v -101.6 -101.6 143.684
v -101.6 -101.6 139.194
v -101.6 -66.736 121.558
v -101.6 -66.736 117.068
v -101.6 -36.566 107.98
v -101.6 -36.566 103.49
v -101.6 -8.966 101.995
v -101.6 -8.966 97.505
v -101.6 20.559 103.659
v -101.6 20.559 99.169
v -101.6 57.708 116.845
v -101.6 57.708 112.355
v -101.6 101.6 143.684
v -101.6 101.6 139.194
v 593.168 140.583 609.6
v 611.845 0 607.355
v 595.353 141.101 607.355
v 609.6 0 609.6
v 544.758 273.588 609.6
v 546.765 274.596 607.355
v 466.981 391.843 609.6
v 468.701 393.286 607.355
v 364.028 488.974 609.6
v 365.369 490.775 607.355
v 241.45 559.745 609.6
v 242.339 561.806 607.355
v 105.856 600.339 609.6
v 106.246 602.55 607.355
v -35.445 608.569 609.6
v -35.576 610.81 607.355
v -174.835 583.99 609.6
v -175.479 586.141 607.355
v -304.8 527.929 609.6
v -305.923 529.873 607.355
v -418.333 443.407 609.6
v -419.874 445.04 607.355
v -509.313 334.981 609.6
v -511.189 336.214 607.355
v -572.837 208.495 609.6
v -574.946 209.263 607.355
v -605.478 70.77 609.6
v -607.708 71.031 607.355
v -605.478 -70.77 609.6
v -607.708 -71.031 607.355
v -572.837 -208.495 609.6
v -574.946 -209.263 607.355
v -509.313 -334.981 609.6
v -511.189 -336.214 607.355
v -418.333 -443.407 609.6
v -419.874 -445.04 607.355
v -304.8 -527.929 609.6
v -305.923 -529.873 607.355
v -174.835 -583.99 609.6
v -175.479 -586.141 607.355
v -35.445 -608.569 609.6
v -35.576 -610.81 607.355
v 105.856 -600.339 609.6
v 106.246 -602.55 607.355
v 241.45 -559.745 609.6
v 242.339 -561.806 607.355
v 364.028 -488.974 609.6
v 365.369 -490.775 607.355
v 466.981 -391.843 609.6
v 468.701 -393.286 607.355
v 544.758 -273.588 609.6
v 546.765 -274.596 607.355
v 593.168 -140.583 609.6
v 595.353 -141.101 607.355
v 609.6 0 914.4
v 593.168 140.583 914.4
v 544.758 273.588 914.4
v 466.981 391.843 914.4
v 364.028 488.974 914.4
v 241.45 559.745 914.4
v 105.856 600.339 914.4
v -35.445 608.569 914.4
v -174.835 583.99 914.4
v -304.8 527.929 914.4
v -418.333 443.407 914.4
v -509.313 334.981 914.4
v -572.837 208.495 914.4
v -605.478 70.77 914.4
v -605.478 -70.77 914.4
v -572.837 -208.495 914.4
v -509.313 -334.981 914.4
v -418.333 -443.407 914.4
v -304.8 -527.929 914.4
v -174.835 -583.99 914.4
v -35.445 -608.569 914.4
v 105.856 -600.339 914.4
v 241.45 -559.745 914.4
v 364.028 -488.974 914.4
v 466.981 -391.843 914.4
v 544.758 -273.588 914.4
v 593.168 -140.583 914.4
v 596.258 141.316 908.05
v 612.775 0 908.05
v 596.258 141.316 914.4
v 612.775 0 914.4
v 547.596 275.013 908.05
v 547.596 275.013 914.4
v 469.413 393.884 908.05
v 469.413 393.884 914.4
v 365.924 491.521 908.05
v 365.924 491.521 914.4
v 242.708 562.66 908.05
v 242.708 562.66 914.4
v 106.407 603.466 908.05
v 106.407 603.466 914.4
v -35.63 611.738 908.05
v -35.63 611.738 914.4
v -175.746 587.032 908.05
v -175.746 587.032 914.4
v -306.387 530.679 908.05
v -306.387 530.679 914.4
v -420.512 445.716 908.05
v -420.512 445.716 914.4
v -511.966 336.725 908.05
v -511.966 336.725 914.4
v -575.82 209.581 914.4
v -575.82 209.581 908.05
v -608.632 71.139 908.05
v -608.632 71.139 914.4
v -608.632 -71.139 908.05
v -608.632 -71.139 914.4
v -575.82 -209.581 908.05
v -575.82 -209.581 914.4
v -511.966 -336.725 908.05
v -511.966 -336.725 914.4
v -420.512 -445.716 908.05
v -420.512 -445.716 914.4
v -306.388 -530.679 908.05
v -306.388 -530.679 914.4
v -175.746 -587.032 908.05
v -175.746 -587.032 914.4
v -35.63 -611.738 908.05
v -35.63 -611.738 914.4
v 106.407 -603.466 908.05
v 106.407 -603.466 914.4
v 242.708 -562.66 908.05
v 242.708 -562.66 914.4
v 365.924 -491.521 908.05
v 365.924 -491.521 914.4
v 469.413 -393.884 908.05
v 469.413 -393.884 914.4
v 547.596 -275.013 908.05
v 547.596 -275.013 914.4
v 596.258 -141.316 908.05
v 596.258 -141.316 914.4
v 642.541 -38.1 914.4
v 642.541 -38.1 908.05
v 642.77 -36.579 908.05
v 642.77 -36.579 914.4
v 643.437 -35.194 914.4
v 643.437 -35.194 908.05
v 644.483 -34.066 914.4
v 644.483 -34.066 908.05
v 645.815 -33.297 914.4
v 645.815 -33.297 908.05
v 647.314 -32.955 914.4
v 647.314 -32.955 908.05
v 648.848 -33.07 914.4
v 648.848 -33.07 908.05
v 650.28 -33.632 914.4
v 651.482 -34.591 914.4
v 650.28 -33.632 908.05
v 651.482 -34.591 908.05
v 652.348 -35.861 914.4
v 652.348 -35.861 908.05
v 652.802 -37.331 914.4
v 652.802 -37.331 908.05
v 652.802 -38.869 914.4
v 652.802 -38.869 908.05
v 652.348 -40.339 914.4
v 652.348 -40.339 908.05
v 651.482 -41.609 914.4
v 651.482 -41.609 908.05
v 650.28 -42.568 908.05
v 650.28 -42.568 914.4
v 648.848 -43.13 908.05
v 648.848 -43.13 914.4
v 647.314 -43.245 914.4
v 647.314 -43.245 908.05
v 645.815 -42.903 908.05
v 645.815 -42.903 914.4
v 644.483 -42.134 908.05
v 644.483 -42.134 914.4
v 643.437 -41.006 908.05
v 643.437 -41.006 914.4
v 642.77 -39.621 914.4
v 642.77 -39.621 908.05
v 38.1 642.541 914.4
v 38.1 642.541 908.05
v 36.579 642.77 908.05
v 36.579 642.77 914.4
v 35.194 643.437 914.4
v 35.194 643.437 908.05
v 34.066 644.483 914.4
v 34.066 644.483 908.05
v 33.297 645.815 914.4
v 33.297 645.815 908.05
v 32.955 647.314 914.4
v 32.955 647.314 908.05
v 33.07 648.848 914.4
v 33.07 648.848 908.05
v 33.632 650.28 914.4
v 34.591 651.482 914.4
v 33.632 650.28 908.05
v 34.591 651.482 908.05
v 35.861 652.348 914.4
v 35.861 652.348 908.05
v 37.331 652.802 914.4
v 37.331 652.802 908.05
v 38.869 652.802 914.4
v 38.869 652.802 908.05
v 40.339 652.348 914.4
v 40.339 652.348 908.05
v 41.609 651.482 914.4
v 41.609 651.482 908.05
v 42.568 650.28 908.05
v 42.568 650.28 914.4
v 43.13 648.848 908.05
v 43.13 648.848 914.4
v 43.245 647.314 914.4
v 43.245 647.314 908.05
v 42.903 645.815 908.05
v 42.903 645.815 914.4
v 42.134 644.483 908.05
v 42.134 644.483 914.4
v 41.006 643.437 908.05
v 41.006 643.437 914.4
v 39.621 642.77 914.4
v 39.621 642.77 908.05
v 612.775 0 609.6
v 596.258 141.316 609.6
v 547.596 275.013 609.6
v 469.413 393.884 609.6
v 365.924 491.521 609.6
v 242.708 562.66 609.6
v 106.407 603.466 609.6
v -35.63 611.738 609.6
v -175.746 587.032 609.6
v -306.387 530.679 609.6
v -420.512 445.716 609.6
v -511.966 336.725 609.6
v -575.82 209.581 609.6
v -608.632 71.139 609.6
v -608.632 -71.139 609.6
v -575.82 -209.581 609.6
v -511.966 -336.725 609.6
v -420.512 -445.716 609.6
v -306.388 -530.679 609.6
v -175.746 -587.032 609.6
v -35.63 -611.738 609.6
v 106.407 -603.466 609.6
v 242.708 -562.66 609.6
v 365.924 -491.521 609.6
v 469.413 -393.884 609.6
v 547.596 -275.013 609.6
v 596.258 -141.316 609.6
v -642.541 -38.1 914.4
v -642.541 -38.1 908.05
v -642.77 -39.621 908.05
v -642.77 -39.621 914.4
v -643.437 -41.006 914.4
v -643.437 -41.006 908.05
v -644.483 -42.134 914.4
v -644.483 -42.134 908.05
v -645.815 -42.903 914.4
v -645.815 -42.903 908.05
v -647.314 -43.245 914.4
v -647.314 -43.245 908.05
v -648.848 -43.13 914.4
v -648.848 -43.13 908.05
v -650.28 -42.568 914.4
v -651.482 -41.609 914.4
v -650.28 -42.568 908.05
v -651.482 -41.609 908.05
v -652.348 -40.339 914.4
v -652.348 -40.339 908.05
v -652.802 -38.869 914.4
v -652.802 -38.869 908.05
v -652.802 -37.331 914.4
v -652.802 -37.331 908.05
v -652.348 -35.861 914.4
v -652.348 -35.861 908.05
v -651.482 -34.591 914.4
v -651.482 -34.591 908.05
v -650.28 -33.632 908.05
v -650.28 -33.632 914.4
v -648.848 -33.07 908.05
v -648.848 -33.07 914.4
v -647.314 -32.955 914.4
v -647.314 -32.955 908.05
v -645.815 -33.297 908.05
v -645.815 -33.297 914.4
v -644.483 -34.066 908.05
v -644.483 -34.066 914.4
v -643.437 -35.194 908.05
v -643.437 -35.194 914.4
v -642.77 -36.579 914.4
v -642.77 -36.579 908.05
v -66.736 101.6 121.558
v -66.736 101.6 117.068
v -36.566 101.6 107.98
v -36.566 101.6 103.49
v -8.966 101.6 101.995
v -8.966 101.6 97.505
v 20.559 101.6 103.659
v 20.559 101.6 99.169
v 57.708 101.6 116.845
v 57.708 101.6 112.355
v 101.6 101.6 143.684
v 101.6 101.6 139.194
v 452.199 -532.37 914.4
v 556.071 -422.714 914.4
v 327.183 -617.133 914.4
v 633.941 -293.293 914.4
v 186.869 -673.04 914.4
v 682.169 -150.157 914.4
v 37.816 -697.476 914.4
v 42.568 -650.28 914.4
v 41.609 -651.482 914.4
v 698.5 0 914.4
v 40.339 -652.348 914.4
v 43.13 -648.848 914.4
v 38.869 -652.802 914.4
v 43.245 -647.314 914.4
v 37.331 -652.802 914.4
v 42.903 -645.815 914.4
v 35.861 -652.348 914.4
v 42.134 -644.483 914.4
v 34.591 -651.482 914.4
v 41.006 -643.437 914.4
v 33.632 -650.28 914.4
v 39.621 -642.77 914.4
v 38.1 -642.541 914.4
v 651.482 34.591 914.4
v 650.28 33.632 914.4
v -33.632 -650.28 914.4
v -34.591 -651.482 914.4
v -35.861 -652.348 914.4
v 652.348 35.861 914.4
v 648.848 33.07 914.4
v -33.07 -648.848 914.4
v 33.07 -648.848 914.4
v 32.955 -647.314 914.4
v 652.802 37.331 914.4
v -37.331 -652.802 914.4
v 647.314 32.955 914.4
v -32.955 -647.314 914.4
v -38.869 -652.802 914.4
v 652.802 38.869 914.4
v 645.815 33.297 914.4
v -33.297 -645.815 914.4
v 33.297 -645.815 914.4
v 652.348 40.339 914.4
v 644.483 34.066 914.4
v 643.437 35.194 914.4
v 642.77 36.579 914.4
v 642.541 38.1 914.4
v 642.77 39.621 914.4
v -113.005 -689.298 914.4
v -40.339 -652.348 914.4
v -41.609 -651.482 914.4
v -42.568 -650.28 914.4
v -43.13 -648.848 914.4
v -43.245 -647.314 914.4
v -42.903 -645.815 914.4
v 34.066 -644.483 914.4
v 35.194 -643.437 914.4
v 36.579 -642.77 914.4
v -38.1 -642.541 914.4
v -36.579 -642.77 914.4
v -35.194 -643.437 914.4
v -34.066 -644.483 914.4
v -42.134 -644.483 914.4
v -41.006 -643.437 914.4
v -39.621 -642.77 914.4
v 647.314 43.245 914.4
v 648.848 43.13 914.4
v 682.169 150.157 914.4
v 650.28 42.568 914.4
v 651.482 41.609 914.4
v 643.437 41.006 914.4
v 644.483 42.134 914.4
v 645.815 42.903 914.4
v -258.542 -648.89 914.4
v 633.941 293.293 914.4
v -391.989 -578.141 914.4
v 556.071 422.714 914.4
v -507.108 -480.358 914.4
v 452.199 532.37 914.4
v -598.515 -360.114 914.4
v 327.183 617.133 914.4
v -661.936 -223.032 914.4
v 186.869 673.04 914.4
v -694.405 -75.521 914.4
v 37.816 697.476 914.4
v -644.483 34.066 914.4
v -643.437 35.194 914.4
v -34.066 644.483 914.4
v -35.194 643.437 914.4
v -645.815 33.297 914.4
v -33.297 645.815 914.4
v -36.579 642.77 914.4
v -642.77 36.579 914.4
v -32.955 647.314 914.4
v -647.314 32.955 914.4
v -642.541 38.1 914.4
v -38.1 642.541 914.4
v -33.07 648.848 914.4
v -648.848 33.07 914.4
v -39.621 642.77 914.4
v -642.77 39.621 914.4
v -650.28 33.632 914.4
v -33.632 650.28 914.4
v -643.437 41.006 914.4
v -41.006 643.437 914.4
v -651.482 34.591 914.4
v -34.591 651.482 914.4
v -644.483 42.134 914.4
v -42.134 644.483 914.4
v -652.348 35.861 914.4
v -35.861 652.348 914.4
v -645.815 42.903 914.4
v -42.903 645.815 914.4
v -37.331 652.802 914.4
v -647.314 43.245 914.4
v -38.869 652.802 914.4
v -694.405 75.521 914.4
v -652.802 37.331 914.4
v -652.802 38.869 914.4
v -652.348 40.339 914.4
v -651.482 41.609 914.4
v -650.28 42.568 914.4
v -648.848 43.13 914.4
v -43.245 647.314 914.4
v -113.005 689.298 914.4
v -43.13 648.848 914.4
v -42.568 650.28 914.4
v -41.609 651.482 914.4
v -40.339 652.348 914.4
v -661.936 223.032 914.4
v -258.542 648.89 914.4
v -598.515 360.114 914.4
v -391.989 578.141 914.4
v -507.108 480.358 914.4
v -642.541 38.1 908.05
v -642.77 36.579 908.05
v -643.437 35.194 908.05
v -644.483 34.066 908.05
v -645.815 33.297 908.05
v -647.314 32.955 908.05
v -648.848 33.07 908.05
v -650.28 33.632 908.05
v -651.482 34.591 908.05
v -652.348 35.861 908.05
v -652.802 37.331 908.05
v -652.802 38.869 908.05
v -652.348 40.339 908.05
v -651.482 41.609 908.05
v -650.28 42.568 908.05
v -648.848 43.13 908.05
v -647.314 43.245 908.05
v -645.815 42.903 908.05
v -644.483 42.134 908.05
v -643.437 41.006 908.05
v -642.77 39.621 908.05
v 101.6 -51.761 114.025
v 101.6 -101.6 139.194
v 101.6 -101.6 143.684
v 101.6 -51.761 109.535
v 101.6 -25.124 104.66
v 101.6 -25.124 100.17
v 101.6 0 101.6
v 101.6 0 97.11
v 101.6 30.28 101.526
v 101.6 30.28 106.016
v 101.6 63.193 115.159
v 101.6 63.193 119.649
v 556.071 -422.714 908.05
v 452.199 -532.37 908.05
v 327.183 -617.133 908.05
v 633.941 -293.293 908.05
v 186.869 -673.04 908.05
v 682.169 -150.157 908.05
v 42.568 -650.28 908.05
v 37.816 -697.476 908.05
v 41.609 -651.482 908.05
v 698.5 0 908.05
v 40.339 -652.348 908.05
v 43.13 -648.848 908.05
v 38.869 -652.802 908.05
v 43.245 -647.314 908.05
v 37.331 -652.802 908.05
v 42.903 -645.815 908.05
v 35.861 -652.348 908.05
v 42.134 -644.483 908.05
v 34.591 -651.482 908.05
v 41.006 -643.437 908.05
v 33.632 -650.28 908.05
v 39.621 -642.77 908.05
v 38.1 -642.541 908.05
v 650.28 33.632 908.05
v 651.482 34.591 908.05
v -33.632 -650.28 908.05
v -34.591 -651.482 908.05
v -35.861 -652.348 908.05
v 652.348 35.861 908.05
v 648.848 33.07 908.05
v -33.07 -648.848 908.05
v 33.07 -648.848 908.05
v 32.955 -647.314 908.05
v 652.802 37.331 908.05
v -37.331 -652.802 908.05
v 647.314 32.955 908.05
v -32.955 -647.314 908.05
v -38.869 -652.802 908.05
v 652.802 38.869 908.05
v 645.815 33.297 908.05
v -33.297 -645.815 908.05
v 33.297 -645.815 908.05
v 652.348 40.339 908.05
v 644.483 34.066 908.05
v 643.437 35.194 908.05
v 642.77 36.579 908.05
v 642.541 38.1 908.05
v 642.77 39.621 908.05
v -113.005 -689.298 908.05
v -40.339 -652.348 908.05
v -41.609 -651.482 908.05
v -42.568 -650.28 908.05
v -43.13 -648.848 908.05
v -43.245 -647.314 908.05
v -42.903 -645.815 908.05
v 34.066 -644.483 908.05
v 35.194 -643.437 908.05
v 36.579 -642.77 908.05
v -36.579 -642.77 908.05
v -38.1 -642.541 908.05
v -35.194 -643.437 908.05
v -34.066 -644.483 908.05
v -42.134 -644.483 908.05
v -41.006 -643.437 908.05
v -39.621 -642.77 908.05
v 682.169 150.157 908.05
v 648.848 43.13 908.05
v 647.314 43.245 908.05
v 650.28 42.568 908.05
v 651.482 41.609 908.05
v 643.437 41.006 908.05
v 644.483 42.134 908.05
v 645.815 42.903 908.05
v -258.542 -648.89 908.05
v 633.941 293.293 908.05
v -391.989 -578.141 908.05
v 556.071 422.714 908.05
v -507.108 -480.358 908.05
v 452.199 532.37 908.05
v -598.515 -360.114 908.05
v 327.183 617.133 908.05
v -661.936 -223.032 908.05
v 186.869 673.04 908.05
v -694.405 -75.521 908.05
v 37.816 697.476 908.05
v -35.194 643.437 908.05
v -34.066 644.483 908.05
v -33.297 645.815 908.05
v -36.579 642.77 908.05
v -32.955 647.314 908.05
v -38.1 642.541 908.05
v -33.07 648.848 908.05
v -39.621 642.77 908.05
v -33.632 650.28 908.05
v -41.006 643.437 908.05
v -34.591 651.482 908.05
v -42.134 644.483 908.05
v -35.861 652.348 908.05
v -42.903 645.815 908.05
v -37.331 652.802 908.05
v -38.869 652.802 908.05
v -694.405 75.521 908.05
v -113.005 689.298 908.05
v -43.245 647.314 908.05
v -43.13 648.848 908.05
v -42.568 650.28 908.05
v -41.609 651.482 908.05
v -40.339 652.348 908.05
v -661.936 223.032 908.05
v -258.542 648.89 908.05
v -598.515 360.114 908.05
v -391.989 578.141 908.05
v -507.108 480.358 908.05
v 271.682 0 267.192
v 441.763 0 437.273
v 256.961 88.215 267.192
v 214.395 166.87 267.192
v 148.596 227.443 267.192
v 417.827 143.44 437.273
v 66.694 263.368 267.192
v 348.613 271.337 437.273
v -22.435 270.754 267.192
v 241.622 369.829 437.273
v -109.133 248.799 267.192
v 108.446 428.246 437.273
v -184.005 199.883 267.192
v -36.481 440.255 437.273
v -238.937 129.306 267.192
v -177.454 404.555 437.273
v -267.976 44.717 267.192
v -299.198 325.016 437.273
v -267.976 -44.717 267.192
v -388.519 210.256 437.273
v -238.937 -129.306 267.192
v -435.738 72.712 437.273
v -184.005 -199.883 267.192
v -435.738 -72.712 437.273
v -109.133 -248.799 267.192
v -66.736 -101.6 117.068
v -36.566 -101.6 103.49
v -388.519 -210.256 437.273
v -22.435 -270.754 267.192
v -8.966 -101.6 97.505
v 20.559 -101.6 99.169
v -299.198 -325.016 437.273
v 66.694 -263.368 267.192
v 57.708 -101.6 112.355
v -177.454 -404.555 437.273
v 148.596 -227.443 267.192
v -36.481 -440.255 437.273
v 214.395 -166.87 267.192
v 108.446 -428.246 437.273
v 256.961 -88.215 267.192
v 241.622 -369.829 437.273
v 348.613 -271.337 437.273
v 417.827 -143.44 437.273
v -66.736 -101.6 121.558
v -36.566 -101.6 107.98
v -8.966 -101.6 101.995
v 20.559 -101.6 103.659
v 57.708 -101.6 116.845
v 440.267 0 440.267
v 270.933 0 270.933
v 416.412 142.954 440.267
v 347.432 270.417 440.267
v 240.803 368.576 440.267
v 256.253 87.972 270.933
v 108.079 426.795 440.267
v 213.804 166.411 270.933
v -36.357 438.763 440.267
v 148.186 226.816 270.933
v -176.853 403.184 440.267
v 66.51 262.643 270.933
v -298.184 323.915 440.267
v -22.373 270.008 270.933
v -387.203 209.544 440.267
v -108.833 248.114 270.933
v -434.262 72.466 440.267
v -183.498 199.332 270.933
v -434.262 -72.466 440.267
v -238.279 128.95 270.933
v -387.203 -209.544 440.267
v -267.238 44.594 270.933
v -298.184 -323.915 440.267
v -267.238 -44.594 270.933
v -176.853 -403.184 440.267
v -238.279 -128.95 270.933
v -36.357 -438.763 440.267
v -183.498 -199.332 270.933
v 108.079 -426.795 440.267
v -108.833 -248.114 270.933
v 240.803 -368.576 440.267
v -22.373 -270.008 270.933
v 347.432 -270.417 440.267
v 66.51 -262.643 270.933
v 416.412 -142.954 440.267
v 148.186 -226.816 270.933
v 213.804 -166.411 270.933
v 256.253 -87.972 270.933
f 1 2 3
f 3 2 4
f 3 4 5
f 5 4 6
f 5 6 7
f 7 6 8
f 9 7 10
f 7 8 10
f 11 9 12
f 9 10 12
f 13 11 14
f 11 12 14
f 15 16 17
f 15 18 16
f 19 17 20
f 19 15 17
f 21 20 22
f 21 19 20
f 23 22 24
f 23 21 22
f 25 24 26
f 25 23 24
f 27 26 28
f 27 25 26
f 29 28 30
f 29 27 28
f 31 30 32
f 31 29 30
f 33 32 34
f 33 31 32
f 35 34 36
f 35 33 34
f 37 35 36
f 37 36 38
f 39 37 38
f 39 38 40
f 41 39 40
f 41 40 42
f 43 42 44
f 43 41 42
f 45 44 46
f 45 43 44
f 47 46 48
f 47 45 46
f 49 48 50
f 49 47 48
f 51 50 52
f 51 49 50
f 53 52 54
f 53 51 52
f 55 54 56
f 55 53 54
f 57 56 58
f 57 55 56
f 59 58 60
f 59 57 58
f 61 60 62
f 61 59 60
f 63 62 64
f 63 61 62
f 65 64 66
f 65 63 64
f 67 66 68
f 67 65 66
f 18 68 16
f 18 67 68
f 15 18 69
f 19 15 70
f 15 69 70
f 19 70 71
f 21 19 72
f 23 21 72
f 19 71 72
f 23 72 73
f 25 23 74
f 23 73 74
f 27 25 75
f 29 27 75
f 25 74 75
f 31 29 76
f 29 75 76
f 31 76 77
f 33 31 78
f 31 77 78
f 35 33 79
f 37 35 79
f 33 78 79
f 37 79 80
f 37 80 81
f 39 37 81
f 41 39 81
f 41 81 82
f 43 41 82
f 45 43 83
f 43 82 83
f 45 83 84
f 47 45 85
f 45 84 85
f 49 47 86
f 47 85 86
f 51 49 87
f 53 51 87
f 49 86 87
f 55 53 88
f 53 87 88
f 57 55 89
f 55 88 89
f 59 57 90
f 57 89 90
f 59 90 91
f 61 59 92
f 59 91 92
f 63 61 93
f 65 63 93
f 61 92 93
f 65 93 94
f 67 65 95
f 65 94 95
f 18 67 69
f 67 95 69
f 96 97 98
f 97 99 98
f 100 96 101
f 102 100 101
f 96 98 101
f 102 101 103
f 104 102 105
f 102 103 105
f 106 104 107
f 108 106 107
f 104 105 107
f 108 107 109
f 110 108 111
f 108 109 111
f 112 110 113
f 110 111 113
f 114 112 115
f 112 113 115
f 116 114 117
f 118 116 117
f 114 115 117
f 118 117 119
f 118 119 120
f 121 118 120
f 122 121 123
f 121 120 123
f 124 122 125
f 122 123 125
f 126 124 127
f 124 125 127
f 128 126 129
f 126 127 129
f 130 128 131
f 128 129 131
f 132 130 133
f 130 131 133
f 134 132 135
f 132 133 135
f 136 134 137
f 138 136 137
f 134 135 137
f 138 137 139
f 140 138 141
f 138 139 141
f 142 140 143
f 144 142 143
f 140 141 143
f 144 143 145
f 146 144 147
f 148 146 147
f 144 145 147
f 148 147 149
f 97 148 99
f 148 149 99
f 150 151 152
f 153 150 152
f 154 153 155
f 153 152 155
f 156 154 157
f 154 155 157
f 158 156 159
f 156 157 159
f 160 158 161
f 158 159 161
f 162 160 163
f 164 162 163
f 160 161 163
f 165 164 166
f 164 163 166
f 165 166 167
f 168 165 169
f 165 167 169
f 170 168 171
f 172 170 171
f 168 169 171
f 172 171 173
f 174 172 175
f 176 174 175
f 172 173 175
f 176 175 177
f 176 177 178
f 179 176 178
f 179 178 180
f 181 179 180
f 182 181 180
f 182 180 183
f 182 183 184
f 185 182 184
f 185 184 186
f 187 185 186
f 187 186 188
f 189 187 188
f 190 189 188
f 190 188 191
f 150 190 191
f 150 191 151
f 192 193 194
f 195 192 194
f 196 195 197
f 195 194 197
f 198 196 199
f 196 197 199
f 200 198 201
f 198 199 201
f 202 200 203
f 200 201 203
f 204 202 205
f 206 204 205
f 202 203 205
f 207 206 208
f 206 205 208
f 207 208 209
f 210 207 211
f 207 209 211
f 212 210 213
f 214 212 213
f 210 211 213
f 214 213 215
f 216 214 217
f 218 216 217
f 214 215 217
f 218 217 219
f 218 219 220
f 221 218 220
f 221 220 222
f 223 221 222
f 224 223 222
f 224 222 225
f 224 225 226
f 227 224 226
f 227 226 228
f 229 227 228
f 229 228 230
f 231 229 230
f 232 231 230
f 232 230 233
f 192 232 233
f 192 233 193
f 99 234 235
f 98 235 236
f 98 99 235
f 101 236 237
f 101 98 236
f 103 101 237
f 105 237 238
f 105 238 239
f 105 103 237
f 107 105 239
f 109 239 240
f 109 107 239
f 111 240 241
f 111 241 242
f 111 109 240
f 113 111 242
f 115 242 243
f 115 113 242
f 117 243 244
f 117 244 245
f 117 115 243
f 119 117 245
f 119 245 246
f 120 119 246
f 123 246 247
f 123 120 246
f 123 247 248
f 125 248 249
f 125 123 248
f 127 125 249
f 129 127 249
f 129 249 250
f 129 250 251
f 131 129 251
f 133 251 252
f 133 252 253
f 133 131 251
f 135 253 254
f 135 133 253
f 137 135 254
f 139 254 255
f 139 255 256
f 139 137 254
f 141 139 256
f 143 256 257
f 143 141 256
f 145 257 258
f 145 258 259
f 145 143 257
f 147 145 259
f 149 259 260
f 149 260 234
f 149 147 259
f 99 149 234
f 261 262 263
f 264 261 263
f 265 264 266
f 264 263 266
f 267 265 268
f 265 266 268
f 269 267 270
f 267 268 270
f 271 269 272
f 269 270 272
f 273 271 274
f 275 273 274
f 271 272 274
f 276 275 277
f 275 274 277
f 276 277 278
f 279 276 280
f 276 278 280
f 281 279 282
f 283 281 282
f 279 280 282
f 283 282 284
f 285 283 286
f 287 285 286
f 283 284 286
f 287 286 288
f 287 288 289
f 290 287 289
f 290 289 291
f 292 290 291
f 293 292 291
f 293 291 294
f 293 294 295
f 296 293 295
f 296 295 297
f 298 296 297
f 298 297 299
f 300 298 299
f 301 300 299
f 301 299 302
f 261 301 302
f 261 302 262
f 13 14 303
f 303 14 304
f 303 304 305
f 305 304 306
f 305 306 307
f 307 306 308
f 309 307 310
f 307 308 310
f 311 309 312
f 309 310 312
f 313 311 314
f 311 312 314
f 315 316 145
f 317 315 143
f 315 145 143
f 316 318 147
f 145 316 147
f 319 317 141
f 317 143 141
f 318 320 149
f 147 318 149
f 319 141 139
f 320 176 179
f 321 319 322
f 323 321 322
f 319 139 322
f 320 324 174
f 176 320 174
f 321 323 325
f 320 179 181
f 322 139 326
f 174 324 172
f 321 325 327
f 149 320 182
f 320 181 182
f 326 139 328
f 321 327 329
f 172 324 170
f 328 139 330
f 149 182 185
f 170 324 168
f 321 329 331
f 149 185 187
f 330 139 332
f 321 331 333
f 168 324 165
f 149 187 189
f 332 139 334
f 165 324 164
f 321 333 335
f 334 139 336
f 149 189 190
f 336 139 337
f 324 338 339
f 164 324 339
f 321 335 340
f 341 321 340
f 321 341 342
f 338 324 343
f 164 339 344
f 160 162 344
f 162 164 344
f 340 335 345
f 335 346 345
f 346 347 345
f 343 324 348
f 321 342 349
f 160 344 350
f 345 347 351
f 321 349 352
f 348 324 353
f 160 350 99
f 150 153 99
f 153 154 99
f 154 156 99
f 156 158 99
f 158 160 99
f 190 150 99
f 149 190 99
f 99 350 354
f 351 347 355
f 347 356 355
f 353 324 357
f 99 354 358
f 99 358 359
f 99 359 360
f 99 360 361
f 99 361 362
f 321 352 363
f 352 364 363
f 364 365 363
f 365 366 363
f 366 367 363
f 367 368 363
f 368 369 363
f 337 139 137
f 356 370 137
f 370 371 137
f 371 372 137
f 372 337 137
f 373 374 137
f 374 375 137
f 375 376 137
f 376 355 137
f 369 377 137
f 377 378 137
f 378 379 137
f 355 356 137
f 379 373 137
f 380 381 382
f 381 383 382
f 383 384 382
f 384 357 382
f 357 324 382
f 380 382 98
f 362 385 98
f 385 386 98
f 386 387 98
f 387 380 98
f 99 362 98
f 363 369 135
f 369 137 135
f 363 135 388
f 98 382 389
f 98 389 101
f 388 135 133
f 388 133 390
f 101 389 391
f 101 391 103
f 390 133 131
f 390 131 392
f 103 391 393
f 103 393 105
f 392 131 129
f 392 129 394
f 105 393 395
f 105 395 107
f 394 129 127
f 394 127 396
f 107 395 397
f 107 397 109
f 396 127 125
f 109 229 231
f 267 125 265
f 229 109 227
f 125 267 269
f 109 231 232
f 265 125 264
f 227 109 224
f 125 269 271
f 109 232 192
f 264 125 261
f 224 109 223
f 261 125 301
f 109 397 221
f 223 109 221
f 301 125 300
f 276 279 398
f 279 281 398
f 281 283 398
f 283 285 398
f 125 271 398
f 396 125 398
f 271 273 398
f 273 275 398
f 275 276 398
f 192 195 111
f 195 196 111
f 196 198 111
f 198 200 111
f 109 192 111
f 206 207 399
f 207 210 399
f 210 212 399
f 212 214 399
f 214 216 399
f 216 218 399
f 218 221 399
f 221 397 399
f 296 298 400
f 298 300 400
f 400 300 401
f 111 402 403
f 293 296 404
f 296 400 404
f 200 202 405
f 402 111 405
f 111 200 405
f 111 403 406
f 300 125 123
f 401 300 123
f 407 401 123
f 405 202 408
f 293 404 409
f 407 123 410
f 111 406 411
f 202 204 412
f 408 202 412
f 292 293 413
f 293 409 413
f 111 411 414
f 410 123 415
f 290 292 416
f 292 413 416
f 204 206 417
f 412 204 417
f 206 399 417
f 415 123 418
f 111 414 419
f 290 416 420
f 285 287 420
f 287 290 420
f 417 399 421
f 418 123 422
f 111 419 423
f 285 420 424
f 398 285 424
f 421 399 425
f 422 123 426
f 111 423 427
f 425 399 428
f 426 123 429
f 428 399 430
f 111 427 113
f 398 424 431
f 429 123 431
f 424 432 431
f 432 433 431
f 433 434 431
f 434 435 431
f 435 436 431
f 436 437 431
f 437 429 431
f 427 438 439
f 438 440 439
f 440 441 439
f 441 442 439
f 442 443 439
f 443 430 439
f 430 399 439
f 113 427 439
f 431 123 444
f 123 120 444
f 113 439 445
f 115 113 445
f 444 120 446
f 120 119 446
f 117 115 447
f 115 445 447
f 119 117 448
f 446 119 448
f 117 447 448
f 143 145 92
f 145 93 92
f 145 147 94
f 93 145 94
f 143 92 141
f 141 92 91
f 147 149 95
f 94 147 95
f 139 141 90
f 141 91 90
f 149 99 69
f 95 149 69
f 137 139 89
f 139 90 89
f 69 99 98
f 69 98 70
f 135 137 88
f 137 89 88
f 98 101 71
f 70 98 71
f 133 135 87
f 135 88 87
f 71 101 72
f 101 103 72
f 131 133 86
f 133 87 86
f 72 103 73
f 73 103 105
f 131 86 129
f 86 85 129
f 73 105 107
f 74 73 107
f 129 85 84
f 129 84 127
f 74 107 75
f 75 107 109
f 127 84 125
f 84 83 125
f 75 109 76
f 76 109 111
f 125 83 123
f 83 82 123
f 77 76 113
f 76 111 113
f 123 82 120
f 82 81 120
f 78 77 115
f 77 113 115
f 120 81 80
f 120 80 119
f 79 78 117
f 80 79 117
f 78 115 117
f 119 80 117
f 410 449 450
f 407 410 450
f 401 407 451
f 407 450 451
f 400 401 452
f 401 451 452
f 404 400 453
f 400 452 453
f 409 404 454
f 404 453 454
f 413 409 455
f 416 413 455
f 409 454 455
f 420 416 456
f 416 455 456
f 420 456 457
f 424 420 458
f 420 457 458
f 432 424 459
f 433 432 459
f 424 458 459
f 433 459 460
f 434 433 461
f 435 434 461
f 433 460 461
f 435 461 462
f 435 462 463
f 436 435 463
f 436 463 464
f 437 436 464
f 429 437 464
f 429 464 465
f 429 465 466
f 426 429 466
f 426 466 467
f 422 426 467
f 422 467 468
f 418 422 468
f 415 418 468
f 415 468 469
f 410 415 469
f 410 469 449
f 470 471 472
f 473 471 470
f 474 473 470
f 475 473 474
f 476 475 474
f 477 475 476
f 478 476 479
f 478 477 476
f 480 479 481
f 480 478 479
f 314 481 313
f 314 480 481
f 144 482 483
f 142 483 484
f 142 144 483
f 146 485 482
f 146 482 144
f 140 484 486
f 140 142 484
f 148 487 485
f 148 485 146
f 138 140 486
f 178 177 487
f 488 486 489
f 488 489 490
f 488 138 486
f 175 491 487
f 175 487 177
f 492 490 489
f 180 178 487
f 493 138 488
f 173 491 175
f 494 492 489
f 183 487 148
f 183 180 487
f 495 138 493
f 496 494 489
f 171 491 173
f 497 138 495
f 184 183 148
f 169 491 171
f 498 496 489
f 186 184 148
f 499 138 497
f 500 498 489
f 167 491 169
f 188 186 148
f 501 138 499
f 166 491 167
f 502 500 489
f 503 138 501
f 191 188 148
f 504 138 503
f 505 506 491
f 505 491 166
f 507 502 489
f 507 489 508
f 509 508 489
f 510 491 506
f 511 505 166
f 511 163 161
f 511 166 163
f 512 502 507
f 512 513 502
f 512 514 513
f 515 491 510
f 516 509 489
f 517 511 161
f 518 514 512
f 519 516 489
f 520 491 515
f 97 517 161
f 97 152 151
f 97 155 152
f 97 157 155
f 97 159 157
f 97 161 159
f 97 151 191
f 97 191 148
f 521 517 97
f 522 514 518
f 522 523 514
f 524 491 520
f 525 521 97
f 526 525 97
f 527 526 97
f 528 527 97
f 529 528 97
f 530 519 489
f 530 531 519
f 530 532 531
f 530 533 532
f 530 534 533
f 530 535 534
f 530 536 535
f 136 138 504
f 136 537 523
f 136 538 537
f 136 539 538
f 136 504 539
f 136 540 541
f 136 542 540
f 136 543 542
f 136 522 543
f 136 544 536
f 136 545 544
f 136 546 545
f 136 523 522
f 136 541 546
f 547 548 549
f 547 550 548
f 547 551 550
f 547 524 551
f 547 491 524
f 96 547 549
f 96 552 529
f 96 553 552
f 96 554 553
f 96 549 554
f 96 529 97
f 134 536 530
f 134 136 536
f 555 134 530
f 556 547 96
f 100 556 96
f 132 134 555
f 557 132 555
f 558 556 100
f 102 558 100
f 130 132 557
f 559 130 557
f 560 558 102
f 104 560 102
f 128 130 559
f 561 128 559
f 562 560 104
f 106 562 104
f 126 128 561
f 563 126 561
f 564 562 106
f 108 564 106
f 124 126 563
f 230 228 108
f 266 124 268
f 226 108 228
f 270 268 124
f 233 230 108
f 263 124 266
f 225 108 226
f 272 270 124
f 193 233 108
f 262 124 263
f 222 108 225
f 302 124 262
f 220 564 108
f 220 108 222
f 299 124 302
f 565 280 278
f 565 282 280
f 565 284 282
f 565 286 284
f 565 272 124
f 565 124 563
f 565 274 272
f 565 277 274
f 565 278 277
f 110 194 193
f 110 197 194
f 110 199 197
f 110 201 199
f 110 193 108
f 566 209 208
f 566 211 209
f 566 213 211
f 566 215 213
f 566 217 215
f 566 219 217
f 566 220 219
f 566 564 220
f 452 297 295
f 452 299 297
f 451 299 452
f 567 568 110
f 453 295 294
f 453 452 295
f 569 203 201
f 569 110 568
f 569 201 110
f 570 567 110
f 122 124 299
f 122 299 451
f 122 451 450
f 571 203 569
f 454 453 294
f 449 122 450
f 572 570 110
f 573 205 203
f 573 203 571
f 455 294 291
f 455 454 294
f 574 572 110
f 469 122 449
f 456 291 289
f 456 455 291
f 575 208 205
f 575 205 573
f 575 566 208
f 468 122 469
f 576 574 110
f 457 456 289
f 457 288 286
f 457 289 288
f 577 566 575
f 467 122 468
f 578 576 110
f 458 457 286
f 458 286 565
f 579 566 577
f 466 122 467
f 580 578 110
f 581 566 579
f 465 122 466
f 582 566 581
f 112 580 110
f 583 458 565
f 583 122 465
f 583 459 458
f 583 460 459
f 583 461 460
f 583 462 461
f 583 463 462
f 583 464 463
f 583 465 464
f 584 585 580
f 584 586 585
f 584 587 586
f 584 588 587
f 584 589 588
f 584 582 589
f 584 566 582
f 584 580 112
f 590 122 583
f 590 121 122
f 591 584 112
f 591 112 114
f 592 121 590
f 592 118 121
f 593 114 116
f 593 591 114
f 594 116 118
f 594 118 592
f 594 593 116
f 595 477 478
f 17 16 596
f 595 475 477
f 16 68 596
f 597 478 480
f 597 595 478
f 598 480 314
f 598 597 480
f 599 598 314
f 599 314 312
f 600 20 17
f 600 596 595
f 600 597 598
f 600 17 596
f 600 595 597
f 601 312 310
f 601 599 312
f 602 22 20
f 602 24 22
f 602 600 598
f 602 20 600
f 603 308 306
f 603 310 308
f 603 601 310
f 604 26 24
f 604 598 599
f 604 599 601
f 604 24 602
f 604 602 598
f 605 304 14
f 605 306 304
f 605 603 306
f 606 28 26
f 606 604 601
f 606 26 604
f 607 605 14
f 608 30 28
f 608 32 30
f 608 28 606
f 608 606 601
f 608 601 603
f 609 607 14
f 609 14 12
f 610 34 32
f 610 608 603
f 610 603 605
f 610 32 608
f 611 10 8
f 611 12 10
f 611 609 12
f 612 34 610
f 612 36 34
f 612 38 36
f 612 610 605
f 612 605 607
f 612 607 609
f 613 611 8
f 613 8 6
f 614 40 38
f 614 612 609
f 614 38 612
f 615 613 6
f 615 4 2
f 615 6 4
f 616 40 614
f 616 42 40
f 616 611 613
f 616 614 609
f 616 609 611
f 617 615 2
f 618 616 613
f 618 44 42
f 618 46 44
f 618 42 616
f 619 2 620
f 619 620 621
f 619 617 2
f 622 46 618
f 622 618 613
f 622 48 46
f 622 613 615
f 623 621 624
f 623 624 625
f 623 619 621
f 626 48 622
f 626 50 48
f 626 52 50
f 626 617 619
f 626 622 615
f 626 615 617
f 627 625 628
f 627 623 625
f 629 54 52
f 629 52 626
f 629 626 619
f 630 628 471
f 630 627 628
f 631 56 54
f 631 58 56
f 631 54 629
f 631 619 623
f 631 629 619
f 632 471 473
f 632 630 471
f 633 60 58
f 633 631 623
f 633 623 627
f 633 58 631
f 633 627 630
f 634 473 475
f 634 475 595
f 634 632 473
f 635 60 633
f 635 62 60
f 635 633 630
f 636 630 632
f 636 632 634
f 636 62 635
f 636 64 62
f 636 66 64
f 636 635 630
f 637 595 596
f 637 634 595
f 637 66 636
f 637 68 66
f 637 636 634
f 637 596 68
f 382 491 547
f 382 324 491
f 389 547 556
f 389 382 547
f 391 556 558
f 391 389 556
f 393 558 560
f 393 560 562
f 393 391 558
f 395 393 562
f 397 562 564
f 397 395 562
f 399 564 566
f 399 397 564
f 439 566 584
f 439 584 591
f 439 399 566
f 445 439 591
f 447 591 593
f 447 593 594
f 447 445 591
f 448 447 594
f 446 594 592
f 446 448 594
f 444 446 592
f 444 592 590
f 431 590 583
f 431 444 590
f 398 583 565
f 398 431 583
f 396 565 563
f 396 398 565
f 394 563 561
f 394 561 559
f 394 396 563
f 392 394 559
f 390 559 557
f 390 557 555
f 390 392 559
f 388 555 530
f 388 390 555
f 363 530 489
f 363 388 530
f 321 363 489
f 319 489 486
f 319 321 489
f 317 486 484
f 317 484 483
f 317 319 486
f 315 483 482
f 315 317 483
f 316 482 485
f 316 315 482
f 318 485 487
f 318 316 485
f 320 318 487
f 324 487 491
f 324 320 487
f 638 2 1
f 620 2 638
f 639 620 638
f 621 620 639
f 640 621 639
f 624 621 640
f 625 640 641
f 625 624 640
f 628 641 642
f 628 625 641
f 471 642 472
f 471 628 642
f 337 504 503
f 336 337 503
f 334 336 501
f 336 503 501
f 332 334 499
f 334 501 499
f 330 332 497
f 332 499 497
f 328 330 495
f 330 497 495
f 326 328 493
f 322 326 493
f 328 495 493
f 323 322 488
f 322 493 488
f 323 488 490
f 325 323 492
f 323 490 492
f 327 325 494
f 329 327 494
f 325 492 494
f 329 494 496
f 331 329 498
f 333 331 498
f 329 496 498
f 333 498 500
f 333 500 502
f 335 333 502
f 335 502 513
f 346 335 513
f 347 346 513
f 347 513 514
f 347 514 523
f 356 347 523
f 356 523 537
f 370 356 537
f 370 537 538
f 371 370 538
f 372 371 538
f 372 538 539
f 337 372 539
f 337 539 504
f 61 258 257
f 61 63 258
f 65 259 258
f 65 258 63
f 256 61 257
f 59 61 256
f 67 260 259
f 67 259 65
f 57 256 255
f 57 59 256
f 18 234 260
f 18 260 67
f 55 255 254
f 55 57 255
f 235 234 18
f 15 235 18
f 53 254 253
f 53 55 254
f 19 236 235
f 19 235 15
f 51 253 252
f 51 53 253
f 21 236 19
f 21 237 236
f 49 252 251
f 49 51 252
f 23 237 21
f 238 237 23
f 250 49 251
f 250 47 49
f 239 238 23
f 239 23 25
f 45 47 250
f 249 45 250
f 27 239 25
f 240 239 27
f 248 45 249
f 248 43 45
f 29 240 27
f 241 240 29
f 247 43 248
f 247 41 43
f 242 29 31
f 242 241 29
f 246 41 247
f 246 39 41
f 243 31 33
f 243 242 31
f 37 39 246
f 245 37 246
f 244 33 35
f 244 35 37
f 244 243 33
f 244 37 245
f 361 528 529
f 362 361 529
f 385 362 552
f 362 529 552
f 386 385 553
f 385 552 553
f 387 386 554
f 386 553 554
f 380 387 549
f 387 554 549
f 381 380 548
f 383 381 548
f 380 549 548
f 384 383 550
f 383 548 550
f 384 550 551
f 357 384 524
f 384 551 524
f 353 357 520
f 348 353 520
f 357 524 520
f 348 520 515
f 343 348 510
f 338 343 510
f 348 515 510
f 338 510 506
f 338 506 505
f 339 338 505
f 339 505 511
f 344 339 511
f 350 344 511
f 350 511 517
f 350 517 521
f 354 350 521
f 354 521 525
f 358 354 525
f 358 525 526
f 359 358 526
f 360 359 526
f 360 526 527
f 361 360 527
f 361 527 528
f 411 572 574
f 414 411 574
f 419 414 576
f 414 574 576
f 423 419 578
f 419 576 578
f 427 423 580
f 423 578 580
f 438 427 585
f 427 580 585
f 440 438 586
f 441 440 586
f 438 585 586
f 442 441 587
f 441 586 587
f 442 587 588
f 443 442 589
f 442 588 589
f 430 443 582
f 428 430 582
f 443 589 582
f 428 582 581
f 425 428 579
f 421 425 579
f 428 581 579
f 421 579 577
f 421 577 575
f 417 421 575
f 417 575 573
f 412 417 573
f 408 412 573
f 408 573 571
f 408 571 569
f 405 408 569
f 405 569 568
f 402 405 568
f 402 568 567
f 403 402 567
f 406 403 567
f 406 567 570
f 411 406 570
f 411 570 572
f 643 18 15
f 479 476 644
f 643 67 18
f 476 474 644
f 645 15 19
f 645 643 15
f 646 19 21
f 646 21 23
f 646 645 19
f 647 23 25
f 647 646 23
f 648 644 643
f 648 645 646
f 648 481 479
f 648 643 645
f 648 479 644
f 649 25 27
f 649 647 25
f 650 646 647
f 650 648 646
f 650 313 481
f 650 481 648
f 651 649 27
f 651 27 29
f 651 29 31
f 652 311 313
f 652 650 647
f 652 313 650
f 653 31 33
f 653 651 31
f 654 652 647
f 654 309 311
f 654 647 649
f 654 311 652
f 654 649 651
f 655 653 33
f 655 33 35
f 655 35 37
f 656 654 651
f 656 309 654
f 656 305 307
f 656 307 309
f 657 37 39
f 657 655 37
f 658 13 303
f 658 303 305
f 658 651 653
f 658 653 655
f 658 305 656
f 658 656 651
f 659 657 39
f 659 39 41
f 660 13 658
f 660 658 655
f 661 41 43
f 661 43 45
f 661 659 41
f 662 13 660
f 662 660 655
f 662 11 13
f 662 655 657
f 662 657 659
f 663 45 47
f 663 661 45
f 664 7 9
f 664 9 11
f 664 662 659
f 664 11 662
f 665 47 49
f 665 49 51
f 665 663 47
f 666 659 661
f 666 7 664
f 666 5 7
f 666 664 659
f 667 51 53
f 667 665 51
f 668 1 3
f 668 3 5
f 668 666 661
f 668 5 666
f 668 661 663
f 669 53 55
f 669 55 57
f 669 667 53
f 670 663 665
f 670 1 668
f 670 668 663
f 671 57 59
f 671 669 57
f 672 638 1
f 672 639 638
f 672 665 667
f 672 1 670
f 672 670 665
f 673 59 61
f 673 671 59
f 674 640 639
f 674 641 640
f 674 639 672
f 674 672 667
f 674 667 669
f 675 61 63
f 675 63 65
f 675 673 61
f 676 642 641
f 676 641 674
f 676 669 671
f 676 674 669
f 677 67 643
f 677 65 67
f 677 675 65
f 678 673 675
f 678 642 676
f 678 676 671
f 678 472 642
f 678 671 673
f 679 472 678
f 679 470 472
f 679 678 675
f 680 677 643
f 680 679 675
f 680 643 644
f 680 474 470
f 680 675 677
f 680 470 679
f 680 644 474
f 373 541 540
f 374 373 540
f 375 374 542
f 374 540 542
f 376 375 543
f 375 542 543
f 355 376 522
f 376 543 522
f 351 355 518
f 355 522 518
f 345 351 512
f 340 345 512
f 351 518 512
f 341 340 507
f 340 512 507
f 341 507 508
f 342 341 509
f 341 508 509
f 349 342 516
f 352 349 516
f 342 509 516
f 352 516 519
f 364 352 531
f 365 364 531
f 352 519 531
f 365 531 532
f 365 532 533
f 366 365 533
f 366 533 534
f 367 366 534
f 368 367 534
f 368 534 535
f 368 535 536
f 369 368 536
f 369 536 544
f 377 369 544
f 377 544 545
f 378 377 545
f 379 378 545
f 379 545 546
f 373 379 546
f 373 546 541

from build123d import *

# Parameters (mm, degrees)
F2_W            = 203.2
F2_H            = 203.2
F3_DEPTH        = 2.2460640303
F3_DEPTH_BACK   = 609.601
F4_W            = 3.175
F4_H            = 304.8
F6_W            = 85.725
F6_H            = 6.35
F9_D            = 10.31875
F9_COPIES_COUNT = 4


# Not quite as in the source:
# - a length typed as a fraction of an inch, garbled in the dataset ("3 / 203.2 mm" for 3/8 in), is restored
# - a pattern or mirror of a feature is missing from the dataset's text; its kind, count and spacing are read off the source's solid


with BuildPart() as f1:
    # F0 (on Front) → F1 (revolve)
    with BuildSketch(Plane.XZ):
        Polygon((609.6, 609.6), (2.2450640303, 2.2450640303), (2.2450640303, -2.2450640303), (611.8450640303, 607.3549359697), align=None)
    revolve(axis=Axis((0, 0, 23.5767196864), (0, 0, 1)))

    # F2 (on Top) → F3 (cut, two sides)
    with BuildSketch(Plane.XY) as f3_sk:
        Rectangle(F2_W, F2_H)
    extrude(amount=-F3_DEPTH, mode=Mode.SUBTRACT)
    extrude(f3_sk.sketch, amount=F3_DEPTH_BACK, mode=Mode.SUBTRACT)


with BuildPart() as f5:
    # F4 (on Front) → F5 (revolve)
    with BuildSketch(Plane.XZ):
        with Locations((611.1875, 762)):
            Rectangle(F4_W, F4_H)
    revolve(axis=Axis((0, 0, 23.5767196864), (0, 0, 1)))


with BuildPart() as f7:
    # F6 (on Front) → F7 (revolve)
    with BuildSketch(Plane.XZ):
        with Locations((655.6375, 911.225)):
            Rectangle(F6_W, F6_H)
    revolve(axis=Axis((0, 0, 23.5767196864), (0, 0, 1)))

    # F9 (through all)
    with Locations(Plane.XY.offset(914.4)):
        with Locations((647.7, 38.1), (647.7, -38.1)):
            f9 = Hole(F9_D / 2)

    # F9_copies: F9 ×4 about axis
    f9_copies_axis = Axis((0, 0, 0), (0, 0, 1))
    for i in range(1, F9_COPIES_COUNT):
        add(f9.rotate(f9_copies_axis, i * 360 / F9_COPIES_COUNT), mode=Mode.SUBTRACT)


solid = Compound([f1.part, f5.part, f7.part])
